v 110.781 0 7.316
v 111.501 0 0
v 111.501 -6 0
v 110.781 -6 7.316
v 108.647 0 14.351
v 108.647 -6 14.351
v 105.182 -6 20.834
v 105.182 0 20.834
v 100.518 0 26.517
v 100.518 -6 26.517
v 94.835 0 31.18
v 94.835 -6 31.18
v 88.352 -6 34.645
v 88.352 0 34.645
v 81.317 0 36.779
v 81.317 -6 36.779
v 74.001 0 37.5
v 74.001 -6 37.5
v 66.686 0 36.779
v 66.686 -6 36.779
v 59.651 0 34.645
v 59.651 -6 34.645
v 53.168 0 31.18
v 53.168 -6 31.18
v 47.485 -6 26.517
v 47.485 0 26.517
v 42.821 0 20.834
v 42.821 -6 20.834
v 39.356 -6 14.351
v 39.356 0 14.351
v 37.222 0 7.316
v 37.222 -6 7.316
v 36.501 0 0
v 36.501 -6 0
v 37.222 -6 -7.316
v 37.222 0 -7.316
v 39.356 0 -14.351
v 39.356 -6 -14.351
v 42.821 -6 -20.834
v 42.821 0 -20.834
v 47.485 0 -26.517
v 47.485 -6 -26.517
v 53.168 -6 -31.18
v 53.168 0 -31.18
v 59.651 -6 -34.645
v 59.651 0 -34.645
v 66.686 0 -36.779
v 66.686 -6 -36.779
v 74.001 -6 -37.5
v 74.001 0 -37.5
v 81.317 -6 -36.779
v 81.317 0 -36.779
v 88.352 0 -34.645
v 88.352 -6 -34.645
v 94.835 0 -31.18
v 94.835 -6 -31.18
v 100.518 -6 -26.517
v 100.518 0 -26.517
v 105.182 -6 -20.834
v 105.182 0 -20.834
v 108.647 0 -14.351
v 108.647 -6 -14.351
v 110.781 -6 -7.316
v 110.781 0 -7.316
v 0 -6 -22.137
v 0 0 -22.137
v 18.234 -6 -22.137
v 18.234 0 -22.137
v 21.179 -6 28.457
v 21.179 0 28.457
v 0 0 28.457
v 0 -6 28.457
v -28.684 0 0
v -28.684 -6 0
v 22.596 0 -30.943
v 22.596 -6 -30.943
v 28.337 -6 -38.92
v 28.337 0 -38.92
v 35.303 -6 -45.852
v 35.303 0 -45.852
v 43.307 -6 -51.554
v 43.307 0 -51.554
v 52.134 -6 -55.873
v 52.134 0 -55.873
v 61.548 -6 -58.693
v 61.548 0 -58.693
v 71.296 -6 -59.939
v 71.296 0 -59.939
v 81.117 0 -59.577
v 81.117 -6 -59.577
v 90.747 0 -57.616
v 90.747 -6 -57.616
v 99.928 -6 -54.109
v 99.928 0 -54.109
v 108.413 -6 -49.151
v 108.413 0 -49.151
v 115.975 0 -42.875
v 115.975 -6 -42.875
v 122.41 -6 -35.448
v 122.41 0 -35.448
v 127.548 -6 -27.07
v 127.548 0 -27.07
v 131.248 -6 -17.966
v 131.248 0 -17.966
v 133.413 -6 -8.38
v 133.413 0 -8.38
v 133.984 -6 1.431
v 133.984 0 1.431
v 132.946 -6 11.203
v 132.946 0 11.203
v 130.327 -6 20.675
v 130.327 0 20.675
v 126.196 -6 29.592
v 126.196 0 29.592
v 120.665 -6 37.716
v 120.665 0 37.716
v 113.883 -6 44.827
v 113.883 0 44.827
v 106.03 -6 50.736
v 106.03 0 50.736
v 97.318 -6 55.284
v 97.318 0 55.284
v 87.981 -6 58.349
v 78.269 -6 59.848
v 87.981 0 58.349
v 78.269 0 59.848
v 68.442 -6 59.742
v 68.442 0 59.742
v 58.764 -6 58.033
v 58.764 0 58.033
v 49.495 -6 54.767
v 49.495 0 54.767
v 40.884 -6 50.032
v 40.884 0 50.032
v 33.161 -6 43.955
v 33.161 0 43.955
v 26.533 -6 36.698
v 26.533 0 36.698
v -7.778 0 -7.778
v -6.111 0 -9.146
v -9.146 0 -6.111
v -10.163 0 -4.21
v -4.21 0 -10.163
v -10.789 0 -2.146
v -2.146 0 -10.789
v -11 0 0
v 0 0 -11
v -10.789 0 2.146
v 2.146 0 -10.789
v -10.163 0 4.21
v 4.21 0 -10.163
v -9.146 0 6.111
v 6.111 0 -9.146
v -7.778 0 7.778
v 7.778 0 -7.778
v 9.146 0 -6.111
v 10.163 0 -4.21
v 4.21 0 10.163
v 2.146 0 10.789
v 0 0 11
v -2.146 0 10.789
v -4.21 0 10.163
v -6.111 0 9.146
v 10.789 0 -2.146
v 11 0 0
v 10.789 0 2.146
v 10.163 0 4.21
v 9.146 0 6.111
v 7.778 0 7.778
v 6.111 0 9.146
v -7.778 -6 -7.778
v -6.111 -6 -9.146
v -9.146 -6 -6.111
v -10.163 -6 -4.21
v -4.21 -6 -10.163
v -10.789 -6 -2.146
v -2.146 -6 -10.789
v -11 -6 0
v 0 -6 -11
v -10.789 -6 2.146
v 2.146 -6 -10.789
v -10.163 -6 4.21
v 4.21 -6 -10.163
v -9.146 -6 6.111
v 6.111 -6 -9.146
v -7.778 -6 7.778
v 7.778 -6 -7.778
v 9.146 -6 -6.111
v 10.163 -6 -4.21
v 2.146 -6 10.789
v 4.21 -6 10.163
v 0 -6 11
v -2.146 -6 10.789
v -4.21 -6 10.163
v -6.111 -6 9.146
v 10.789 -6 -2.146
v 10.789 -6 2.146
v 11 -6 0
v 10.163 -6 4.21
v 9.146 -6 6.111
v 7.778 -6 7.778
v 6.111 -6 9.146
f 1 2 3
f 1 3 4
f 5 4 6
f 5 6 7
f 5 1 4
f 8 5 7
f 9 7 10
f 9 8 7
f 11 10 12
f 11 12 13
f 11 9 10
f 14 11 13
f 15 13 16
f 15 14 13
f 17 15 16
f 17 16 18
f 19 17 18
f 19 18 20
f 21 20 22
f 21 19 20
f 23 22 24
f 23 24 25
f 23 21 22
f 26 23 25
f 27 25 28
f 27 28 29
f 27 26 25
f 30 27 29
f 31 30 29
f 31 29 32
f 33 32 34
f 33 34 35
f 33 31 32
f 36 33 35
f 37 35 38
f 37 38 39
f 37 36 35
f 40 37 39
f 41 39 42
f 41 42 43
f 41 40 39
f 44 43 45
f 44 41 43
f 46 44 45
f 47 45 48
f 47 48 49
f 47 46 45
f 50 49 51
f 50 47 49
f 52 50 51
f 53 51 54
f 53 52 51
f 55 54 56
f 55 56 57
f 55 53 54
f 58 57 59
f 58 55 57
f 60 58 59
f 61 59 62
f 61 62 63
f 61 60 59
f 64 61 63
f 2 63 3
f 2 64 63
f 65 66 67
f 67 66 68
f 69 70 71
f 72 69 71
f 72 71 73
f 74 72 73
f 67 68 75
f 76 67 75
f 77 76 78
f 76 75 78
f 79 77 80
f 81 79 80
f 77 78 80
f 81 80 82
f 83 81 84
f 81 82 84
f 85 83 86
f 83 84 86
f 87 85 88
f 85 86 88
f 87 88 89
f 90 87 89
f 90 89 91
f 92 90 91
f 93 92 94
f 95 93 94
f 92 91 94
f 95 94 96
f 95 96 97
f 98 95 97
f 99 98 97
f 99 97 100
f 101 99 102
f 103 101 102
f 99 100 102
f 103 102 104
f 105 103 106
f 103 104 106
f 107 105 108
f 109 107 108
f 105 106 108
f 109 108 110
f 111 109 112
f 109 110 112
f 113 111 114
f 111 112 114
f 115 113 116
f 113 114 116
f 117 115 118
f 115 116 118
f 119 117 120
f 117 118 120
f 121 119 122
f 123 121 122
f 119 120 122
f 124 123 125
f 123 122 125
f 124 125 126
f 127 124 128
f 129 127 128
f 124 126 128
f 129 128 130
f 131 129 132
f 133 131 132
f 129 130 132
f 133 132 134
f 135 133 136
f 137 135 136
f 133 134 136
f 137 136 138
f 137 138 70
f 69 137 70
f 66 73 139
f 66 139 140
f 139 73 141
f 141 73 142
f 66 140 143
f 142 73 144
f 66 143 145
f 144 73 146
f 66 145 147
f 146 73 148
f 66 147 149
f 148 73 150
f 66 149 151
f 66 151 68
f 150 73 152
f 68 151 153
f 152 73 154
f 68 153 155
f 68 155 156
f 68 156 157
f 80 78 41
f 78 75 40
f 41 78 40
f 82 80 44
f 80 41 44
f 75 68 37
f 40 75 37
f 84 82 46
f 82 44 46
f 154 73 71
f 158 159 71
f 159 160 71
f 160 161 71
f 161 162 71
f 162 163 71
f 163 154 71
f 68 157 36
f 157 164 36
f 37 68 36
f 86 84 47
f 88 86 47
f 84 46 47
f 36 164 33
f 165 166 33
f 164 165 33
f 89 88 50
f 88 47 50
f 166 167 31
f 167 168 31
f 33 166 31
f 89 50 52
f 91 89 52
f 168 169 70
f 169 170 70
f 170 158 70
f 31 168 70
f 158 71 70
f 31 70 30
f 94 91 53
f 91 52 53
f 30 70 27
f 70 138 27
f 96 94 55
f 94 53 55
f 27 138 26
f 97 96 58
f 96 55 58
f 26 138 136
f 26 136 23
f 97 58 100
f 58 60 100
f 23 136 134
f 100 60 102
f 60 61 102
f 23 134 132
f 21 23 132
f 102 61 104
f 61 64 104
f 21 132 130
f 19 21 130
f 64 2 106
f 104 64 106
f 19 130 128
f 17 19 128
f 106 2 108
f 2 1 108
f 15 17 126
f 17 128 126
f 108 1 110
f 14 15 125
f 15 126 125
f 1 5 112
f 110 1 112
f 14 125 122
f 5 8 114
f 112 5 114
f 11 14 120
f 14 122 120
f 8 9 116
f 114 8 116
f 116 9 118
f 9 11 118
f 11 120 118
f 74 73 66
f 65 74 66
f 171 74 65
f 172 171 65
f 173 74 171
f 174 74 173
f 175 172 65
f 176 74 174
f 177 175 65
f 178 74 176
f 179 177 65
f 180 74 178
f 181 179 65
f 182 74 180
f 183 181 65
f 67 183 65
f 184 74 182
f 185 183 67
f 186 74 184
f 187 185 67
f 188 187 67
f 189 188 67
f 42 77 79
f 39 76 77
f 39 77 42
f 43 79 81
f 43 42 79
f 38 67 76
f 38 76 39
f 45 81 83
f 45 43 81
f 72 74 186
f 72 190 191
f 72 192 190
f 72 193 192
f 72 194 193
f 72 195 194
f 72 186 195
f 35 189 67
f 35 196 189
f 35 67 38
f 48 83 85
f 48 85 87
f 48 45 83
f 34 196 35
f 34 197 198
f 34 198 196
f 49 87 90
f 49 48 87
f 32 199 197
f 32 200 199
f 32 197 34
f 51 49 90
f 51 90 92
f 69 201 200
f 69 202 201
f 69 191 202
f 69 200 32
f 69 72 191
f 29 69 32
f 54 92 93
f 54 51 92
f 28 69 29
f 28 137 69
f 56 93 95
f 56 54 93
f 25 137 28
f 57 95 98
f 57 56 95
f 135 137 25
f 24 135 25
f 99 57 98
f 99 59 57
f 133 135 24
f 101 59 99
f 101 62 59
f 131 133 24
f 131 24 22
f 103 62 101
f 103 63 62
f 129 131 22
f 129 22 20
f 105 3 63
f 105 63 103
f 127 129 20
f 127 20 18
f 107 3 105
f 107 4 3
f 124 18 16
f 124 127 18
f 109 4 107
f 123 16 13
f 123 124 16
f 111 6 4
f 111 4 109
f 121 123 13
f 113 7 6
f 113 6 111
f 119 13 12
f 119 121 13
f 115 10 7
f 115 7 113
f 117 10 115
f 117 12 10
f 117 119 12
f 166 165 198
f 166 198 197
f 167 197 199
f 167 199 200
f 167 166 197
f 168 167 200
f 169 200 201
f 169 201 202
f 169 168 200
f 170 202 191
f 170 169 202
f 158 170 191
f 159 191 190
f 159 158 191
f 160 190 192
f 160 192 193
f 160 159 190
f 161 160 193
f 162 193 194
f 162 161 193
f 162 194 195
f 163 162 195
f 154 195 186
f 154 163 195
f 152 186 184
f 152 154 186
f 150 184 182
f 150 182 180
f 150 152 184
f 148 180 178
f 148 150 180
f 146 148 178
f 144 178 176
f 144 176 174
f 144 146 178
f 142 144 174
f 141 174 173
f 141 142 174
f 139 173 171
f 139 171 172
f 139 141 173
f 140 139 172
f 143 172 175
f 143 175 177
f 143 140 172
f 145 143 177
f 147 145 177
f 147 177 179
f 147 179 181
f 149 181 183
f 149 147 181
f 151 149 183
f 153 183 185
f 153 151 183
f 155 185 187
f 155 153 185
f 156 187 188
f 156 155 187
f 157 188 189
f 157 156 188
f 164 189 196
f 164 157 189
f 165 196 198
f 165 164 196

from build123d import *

# Parameters (mm, degrees)
F0_R     = 37.5
F0_R_2   = 11
F1_DEPTH = 6


# Not quite as in the source:
# - a feature names something its author has since deleted; it is built from what else it names


with BuildPart() as f1:
    # F0 (on Front) → F1 (new body)
    with BuildSketch(Plane.XZ):
        with BuildLine():
            ThreePointArc((18.2343609636, -22.1367832273), (85.2703314711, -58.932259595), (134.0014016628, 0))
            ThreePointArc((134.0014016628, 0), (88.6756766088, 58.1778794286), (21.1792131691, 28.4572732836))
            ThreePointArc((21.1792131691, 28.4572732836), (14.1027805373, 3.4864290135), (18.2343609636, -22.1367832273))
        make_face()
        with Locations((74.0014016628, 0)):
            Circle(F0_R, mode=Mode.SUBTRACT)
        with BuildLine():
            ThreePointArc((18.2343609636, -22.1367832273), (14.1027805373, 3.4864290135), (21.1792131691, 28.4572732836))
            Line((21.1792131691, 28.4572732836), (0, 28.4572732836))
            Line((0, 28.4572732836), (-28.6835413426, 0))
            Line((-28.6835413426, 0), (0, -22.1367832273))
            Line((0, -22.1367832273), (18.2343609636, -22.1367832273))
        make_face()
        Circle(F0_R_2, mode=Mode.SUBTRACT)
    extrude(amount=F1_DEPTH)


solid = f1.part
